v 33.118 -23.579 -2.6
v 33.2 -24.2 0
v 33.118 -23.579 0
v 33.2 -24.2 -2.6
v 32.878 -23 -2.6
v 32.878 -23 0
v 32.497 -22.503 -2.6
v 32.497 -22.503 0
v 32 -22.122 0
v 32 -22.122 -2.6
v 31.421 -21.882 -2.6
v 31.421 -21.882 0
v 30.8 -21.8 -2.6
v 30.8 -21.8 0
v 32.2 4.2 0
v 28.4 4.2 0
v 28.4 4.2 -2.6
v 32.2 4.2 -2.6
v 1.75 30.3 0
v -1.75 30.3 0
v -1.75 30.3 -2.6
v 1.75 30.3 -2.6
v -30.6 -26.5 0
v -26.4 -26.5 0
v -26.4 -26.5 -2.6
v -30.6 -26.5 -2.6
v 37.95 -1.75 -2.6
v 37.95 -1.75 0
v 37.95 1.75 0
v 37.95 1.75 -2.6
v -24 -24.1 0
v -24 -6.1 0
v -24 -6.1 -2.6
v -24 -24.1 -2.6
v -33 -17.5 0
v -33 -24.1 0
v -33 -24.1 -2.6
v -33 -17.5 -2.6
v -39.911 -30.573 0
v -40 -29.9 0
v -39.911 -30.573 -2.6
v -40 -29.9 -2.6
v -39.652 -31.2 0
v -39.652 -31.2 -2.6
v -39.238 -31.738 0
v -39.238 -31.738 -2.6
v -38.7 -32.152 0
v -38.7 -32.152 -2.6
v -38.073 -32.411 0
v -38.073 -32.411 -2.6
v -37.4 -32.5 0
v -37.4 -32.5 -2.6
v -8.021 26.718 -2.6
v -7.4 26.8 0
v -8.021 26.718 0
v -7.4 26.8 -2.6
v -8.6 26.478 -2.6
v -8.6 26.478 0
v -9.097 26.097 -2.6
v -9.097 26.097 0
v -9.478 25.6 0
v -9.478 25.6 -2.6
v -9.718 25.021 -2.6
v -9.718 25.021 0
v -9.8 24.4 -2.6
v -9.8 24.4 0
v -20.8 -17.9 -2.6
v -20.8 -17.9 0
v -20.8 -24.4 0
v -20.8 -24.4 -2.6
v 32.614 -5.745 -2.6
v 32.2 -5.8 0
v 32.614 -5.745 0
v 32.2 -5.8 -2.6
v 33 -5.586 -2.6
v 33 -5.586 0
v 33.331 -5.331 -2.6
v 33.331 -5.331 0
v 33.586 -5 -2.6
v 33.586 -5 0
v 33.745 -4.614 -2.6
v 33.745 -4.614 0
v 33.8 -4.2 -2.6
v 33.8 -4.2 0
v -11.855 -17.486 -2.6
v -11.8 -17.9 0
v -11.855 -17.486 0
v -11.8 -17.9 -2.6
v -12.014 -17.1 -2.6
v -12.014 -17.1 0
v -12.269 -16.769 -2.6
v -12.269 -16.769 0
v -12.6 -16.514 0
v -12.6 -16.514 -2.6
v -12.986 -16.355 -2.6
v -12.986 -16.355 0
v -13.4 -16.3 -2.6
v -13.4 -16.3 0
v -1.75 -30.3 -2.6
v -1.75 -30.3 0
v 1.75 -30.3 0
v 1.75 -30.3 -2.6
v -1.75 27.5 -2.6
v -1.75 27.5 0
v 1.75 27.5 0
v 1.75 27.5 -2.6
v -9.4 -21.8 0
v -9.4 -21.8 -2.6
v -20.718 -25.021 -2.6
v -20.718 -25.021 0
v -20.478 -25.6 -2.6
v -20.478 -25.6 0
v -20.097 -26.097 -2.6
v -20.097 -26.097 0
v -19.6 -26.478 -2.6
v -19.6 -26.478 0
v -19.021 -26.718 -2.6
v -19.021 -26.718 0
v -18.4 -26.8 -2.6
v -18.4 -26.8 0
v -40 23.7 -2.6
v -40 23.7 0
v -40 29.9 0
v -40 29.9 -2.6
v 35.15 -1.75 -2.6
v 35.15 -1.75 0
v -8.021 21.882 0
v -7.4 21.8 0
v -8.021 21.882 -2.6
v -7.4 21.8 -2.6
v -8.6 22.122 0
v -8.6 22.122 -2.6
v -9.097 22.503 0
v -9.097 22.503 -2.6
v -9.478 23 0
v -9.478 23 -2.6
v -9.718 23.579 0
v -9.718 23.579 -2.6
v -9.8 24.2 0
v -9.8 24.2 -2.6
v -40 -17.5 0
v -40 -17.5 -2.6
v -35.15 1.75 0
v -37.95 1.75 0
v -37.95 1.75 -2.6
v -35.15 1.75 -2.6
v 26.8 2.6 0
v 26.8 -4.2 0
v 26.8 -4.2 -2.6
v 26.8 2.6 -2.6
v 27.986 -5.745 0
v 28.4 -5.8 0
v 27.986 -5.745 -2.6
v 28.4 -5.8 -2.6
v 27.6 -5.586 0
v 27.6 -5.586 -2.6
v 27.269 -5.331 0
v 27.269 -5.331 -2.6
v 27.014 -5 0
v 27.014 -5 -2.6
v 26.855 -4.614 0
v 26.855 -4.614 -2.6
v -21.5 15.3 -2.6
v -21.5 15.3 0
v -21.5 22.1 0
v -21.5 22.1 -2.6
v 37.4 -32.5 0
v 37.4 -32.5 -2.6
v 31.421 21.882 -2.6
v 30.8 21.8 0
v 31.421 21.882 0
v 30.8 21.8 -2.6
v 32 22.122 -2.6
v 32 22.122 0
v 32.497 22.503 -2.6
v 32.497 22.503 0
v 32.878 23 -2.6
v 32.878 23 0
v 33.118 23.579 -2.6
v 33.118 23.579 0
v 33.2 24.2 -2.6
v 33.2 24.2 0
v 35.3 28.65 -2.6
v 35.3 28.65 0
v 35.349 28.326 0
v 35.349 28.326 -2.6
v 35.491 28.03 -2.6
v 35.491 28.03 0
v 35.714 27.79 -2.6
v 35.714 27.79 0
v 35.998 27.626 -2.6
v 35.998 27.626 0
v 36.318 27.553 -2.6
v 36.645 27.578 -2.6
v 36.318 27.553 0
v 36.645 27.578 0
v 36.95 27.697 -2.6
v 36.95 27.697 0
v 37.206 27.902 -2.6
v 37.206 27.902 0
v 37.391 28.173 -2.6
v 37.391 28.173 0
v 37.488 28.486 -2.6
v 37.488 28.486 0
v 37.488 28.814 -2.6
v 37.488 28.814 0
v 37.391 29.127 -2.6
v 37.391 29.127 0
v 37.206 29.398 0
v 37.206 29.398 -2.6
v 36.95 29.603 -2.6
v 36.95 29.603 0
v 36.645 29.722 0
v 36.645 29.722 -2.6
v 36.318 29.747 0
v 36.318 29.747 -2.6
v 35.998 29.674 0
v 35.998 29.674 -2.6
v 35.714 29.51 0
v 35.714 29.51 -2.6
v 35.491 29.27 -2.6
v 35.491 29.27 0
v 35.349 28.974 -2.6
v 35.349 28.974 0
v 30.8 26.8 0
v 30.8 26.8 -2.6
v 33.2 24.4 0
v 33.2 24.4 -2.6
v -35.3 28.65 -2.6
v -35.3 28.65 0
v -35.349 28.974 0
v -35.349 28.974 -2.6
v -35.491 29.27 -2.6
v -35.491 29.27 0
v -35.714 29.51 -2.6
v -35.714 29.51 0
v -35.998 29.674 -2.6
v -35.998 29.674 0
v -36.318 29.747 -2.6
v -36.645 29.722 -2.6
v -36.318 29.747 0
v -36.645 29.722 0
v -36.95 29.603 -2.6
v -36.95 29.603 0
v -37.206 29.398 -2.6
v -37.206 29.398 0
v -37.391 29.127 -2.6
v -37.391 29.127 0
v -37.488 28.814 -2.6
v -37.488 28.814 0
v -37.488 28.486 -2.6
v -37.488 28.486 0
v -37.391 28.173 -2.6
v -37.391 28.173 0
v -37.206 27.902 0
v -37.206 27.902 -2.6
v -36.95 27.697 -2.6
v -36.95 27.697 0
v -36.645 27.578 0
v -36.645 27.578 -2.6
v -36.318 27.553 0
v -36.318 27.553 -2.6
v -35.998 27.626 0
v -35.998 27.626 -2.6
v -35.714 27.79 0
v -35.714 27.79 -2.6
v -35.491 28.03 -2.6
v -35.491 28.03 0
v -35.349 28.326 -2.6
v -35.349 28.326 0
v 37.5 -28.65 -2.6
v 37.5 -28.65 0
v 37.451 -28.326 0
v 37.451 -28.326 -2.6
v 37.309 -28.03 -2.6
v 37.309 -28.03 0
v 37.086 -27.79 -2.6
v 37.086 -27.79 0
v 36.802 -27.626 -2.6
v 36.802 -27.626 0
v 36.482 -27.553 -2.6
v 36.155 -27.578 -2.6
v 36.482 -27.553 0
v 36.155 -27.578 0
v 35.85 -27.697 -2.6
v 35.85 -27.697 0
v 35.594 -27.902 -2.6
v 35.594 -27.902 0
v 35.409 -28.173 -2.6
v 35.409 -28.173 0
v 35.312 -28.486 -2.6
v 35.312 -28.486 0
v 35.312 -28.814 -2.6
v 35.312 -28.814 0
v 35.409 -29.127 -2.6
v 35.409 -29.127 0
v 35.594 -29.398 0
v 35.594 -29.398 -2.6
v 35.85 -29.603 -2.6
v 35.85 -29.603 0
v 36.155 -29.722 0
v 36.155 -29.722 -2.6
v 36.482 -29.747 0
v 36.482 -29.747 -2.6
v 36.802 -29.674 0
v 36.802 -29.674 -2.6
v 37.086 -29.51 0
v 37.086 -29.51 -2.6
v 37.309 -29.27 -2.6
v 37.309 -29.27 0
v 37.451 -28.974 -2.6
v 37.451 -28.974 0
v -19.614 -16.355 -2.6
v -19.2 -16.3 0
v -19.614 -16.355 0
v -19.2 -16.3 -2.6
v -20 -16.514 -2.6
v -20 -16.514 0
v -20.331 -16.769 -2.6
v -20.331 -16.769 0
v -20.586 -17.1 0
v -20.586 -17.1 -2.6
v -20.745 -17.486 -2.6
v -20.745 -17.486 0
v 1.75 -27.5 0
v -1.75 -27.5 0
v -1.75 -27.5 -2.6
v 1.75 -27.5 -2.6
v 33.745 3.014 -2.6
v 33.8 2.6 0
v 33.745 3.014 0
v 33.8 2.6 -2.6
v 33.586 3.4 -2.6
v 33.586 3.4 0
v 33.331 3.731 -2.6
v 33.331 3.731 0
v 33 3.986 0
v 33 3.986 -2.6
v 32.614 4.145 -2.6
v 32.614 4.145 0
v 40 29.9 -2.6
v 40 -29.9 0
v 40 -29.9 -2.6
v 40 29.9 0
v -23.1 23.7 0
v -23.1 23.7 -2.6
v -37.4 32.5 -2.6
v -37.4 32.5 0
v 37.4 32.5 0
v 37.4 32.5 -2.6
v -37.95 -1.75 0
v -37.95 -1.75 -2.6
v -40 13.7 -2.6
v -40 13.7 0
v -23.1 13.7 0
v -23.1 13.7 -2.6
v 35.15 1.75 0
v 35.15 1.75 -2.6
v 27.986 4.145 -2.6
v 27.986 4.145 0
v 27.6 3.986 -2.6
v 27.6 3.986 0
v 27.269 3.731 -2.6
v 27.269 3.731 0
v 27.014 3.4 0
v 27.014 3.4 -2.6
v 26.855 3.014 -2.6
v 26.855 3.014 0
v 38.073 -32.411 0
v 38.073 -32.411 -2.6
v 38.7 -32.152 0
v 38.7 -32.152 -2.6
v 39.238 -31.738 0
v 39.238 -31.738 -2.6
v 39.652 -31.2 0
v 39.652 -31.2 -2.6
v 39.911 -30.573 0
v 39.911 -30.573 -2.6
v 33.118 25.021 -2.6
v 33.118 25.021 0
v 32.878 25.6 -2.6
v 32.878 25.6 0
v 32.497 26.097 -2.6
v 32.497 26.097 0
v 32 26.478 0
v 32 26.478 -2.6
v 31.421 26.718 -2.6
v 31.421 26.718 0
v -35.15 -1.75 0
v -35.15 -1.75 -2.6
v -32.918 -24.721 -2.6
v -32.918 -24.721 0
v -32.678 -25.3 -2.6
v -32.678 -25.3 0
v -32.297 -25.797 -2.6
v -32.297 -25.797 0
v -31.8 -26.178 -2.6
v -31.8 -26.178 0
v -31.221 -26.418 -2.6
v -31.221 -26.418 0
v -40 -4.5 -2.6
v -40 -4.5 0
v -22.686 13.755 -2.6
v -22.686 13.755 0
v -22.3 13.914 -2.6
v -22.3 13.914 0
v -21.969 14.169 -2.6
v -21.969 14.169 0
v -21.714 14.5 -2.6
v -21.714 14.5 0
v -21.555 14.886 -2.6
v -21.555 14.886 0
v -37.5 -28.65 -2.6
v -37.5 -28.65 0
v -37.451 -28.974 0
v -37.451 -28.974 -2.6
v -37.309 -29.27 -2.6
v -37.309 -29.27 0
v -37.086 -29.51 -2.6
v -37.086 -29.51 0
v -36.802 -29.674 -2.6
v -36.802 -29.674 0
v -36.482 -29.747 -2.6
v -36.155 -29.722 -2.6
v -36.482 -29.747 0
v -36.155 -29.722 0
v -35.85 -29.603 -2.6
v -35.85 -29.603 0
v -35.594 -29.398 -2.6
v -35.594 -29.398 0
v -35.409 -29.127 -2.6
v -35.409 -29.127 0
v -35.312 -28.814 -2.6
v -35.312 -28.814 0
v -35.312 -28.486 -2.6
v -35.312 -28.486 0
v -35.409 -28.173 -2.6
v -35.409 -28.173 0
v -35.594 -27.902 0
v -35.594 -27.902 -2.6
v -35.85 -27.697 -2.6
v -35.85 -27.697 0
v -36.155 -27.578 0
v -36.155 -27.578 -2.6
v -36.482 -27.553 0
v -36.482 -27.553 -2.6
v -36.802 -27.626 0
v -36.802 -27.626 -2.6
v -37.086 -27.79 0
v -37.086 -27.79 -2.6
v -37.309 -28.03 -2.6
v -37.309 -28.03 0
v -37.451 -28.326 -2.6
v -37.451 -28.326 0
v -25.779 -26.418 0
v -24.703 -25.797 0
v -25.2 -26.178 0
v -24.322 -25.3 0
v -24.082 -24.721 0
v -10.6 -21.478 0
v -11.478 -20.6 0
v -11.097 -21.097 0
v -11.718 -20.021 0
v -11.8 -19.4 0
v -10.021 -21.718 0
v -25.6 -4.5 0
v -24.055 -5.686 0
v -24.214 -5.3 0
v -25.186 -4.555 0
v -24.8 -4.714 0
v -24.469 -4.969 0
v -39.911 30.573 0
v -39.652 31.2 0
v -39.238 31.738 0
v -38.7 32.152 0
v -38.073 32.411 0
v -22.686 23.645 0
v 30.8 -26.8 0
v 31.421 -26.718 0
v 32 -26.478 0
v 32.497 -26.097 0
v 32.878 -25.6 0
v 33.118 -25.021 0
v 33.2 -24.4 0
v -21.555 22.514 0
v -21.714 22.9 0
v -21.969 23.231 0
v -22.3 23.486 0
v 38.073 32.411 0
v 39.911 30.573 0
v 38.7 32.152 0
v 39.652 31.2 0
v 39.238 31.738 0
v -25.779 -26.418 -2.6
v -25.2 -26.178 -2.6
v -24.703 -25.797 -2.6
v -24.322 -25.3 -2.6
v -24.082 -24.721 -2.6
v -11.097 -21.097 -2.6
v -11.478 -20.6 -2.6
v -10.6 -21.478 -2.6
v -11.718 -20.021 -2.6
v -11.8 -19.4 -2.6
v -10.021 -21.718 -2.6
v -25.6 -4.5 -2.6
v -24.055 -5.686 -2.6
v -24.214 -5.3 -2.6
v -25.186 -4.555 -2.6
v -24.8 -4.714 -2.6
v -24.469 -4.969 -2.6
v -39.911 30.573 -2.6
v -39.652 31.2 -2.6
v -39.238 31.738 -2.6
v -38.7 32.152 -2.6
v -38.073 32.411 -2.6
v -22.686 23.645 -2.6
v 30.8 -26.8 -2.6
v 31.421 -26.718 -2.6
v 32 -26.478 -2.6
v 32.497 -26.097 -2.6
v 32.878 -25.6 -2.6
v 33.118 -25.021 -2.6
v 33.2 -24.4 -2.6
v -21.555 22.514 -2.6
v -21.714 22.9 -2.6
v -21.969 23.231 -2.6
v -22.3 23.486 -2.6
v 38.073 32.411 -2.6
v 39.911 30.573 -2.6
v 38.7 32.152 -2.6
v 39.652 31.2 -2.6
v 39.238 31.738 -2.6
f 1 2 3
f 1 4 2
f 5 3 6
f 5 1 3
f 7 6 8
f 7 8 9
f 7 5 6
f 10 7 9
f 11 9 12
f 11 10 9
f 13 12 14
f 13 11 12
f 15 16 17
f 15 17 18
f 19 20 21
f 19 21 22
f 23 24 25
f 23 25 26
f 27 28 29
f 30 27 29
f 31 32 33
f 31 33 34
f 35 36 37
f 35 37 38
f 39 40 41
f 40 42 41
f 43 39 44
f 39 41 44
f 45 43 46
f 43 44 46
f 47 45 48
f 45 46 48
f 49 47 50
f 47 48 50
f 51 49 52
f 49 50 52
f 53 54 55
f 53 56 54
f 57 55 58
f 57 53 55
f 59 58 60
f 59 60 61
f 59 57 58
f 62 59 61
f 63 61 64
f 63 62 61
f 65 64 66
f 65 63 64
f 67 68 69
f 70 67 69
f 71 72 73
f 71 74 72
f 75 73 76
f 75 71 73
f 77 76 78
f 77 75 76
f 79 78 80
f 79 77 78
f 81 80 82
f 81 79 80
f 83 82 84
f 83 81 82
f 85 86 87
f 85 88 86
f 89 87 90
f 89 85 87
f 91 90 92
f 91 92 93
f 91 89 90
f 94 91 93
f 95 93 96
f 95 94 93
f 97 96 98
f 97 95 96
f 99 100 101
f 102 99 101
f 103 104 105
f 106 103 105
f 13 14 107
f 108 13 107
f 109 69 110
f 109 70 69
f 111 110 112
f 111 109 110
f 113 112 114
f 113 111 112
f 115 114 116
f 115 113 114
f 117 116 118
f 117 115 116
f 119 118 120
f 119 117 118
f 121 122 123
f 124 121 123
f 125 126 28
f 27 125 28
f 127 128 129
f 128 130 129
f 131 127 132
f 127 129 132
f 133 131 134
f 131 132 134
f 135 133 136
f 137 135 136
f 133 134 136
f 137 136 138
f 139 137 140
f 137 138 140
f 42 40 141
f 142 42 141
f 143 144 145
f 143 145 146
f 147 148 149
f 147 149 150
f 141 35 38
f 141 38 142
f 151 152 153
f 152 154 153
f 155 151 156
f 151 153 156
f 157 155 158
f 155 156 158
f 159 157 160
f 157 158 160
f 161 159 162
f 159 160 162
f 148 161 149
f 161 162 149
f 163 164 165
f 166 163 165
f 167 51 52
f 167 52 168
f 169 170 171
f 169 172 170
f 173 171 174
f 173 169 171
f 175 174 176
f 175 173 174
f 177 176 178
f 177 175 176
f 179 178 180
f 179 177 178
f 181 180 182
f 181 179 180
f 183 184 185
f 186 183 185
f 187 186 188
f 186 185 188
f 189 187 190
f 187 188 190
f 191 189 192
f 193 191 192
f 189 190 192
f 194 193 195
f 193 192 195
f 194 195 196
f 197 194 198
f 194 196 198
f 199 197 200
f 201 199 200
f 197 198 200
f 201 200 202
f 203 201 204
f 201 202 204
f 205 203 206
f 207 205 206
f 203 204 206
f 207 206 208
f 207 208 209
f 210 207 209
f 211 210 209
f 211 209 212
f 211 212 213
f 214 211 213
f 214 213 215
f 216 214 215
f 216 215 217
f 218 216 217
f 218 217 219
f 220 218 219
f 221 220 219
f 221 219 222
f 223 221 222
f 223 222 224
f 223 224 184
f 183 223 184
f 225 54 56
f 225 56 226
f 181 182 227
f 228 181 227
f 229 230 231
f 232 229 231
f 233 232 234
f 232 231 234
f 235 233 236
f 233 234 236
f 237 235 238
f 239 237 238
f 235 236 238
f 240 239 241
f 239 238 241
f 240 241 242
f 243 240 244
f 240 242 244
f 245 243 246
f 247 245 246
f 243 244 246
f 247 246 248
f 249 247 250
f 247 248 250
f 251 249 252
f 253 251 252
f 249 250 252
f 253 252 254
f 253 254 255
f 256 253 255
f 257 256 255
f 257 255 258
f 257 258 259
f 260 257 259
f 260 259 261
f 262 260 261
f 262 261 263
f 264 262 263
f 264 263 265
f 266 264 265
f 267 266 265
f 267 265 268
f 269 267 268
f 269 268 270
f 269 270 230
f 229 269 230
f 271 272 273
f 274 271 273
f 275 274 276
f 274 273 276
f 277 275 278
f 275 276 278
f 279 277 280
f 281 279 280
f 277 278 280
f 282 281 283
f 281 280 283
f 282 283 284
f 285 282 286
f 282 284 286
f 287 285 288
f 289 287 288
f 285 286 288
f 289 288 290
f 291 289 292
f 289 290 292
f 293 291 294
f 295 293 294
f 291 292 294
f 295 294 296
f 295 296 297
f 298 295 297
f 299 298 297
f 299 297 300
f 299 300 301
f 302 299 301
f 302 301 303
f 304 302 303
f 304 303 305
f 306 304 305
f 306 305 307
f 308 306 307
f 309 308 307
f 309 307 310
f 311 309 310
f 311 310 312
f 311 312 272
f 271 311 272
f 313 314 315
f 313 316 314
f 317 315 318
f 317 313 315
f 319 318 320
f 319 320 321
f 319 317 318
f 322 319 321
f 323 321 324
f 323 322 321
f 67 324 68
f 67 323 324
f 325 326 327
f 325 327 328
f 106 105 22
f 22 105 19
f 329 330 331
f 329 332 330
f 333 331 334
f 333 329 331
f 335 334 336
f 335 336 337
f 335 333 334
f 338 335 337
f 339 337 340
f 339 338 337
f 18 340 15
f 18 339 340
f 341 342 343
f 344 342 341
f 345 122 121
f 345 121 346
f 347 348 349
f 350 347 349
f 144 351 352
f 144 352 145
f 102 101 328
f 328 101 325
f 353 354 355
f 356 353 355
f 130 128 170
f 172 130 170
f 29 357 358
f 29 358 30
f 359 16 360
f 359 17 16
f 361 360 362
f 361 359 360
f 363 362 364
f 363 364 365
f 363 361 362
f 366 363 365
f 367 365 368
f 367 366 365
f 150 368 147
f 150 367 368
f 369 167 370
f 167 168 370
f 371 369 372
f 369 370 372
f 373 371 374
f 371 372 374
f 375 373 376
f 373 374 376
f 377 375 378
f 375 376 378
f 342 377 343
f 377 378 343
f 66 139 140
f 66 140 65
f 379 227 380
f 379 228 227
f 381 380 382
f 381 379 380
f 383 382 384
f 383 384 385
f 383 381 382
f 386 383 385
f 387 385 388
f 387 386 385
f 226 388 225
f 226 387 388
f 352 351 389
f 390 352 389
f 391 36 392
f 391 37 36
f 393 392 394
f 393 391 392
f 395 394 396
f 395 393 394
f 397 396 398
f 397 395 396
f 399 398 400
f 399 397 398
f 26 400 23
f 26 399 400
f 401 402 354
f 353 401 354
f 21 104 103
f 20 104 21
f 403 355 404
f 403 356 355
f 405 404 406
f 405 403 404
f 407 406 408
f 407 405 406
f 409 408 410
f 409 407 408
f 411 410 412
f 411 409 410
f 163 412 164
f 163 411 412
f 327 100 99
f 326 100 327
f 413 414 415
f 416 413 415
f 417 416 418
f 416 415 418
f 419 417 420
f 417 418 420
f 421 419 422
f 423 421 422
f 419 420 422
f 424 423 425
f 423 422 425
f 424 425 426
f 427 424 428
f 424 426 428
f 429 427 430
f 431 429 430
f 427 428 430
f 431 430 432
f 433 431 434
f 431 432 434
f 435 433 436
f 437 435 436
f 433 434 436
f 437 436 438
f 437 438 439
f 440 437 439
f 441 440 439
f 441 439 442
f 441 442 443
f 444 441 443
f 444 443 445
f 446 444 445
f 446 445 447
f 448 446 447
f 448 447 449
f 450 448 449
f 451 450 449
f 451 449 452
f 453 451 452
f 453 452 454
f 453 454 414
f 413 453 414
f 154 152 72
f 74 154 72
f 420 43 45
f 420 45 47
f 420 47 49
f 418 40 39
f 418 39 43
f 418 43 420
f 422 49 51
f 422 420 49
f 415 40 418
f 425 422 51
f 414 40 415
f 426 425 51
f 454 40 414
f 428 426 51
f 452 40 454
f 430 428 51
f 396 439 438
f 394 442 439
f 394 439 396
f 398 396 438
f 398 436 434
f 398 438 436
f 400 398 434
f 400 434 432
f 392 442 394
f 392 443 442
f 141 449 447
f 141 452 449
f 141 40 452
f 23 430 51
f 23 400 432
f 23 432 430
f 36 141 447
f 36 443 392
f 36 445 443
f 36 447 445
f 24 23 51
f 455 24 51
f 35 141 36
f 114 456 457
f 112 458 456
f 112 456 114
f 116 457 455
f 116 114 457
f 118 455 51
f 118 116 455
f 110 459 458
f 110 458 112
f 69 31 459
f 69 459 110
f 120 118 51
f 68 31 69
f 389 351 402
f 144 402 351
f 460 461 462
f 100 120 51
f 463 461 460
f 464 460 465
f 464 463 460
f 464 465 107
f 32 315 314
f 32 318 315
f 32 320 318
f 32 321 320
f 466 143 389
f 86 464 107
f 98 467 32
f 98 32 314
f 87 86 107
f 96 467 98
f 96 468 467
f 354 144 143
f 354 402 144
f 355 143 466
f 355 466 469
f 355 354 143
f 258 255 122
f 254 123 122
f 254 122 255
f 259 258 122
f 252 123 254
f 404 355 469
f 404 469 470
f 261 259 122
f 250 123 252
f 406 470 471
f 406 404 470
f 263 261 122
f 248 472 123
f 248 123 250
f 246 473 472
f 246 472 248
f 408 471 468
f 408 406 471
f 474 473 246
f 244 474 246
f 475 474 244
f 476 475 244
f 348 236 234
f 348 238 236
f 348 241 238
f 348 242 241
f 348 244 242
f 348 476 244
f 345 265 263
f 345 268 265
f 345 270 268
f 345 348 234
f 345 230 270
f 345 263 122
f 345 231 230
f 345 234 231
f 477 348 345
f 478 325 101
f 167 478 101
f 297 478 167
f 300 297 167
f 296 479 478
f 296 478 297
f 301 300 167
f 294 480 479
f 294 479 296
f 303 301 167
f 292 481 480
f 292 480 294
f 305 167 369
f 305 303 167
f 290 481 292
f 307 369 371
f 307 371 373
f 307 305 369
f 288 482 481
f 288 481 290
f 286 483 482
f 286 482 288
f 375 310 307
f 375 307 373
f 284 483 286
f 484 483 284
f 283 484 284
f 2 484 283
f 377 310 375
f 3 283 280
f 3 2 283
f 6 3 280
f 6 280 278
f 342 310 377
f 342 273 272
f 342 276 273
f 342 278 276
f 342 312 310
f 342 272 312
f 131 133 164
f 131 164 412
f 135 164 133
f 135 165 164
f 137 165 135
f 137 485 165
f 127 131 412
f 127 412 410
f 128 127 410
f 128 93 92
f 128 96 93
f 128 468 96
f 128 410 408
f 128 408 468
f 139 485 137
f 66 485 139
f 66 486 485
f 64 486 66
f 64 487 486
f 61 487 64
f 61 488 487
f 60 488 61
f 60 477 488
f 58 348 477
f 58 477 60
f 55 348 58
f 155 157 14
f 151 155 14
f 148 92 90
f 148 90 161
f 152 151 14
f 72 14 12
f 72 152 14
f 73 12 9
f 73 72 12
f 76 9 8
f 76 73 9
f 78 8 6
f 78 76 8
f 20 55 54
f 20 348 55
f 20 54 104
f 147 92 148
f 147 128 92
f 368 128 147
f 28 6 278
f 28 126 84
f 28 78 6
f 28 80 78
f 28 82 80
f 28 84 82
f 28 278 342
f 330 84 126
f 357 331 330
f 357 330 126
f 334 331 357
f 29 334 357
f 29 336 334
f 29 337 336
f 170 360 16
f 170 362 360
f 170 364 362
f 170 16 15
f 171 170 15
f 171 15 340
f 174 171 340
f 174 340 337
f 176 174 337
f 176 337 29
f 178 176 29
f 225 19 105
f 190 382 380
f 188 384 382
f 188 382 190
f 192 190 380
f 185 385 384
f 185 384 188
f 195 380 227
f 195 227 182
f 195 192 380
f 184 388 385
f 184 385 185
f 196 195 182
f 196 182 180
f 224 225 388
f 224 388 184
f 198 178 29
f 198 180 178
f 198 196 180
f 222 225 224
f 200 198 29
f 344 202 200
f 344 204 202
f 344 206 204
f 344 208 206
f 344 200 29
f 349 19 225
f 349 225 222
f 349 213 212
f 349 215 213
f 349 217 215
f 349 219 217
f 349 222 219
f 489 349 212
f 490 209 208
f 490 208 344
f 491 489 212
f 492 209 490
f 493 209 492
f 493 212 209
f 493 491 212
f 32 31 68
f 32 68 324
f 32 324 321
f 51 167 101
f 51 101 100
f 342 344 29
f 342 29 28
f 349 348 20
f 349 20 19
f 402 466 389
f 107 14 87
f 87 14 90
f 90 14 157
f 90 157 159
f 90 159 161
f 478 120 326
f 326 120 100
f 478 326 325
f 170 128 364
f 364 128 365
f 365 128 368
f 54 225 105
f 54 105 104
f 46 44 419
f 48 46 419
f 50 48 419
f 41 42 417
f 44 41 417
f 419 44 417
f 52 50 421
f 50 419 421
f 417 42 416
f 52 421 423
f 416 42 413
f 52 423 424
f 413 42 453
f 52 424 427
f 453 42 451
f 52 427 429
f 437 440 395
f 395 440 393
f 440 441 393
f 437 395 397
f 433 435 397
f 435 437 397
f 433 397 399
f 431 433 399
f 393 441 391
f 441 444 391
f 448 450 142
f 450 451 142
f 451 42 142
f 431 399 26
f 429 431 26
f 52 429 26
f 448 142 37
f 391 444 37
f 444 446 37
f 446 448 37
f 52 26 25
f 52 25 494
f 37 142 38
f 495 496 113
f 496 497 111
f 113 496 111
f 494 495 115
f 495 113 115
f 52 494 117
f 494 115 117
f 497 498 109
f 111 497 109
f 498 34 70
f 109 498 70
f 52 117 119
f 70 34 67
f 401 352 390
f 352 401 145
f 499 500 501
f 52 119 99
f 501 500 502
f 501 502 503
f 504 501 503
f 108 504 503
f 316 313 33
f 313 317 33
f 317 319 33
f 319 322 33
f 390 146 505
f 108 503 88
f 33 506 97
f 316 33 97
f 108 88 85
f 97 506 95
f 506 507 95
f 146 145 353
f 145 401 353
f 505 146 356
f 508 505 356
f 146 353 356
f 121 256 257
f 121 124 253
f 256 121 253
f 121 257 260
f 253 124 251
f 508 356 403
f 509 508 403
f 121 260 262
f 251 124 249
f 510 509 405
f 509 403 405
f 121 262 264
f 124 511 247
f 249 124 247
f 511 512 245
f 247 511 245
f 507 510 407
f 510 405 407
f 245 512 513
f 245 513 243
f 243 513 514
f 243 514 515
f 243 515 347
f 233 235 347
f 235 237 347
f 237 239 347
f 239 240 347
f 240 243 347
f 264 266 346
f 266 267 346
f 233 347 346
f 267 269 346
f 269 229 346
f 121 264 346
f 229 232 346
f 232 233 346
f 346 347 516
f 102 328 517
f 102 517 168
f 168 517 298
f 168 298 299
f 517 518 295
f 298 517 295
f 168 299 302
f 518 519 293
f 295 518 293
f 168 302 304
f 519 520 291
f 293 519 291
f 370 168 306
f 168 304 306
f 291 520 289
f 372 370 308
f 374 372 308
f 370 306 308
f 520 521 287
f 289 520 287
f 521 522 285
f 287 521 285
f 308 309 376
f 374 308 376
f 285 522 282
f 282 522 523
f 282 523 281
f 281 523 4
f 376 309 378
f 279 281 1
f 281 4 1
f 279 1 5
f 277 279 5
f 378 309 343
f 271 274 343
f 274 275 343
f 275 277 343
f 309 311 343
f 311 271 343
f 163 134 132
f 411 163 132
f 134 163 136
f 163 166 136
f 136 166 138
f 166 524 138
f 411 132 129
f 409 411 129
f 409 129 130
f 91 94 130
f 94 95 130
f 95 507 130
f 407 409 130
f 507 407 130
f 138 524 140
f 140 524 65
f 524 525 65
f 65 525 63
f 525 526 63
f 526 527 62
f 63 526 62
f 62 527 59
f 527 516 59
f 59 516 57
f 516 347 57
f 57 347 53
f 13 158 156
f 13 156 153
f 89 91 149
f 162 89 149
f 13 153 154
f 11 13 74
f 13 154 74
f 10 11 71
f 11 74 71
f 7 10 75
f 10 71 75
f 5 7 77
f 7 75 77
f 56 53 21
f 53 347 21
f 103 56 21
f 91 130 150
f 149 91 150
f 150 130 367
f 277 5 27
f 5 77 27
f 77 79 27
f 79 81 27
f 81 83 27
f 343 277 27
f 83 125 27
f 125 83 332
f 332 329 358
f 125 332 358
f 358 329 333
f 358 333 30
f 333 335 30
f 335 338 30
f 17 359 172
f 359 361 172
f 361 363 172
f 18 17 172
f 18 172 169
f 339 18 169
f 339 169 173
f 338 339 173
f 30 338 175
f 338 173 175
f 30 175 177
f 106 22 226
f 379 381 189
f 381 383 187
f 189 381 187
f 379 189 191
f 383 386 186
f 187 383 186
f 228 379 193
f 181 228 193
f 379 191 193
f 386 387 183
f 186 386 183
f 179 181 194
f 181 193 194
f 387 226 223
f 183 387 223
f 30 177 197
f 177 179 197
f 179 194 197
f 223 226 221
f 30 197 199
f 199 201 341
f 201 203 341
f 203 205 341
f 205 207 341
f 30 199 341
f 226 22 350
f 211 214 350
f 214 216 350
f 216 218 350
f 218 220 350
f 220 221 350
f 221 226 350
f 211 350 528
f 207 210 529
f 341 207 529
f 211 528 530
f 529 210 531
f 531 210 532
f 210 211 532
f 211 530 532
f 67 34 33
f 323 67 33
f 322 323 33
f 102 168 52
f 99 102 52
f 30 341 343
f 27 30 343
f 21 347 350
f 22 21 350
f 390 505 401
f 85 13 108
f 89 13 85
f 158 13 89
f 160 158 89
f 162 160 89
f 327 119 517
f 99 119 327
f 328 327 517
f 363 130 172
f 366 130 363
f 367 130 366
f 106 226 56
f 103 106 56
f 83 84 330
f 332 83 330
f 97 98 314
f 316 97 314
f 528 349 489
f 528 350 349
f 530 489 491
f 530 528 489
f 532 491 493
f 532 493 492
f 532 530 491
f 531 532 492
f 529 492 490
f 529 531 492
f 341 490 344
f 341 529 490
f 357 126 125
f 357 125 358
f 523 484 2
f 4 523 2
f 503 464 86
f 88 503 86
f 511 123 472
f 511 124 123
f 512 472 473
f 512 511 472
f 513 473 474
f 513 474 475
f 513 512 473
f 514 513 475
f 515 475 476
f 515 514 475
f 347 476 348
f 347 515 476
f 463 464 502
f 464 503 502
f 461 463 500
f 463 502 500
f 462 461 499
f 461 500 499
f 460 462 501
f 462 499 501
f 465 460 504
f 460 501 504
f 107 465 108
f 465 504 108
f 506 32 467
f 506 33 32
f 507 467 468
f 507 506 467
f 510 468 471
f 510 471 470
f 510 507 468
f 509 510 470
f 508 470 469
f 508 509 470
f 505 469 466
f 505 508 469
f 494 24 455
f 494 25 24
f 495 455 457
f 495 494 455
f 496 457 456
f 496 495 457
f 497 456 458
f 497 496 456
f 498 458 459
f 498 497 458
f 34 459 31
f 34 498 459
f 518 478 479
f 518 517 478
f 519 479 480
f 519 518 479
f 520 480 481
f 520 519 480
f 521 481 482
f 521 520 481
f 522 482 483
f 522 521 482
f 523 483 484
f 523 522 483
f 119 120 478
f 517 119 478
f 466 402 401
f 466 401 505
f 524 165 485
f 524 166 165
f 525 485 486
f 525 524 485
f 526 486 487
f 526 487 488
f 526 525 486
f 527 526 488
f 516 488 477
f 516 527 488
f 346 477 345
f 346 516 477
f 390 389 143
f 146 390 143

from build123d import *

# Parameters (mm, degrees)
SKETCH1_W          = 80
SKETCH1_H          = 65
BASE_FLANGE1_DEPTH = 2.6
SKETCH6_R          = 1.0999978
CUT_EXTRUDE1_DEPTH = 10
FILLET1_R          = 2.6
SKETCH7_W          = 18.5
SKETCH7_H          = 10
SKETCH7_W_2        = 43
SKETCH7_H_2        = 5
SKETCH7_W_3        = 7
CUT_EXTRUDE2_DEPTH = 2.6
FILLET2_R          = 2.4
FILLET3_R          = 1.6
SKETCH11_W         = 3.5
SKETCH11_H         = 2.8
SKETCH11_W_2       = 2.8
SKETCH11_H_2       = 3.5
CUT_EXTRUDE5_DEPTH = 10


# Sheet-metal steps are written as plain solids
with BuildPart() as part:
    # Sketch1 → Base-Flange1 (new body)
    with BuildSketch(Plane.XY):
        Rectangle(SKETCH1_W, SKETCH1_H)
    extrude(amount=-BASE_FLANGE1_DEPTH)

    # Sketch6 → Cut-Extrude1 (cut)
    with BuildSketch(Plane.XY):
        with Locations((-36.4, 28.65)):
            Circle(SKETCH6_R)
        with Locations(Location((-36.4, -28.65, 0), (0, 0, 180))):
            Circle(SKETCH6_R)
        with Locations((36.4, -28.65)):
            Circle(SKETCH6_R)
        with Locations(Location((36.4, 28.65, 0), (0, 0, 180))):
            Circle(SKETCH6_R)
    extrude(amount=-CUT_EXTRUDE1_DEPTH, mode=Mode.SUBTRACT)

    # Fillet1
    fillet1_edges = [part.edges().sort_by_distance(p)[0] for p in [
        (-40, 32.5, -1.3),
        (40, 32.5, -1.3),
        (40, -32.5, -1.3),
        (-40, -32.5, -1.3),
    ]]
    fillet(fillet1_edges, radius=FILLET1_R)

    # Sketch7 → Cut-Extrude2 (cut)
    with BuildSketch(Plane.XY):
        with Locations((-30.75, 18.7)):
            Rectangle(SKETCH7_W, SKETCH7_H)
        Polygon((-40, -4.5), (-24, -4.5), (-24, -26.5), (-33, -26.5), (-33, -17.5), (-40, -17.5), align=None)
        with Locations((11.7, 24.3)):
            Rectangle(SKETCH7_W_2, SKETCH7_H_2)
        Polygon((-11.8, -21.8), (-11.8, -16.3), (-20.8, -16.3), (-20.8, -26.8), (33.2, -26.8), (33.2, -21.8), align=None)
        with Locations((30.3, -0.8)):
            Rectangle(SKETCH7_W_3, SKETCH7_H)
    extrude(amount=-CUT_EXTRUDE2_DEPTH, mode=Mode.SUBTRACT)

    # Fillet2
    fillet2_edges = [part.edges().sort_by_distance(p)[0] for p in [
        (-9.8, 21.8, -1.3),
        (-9.8, 26.8, -1.3),
        (33.2, 26.8, -1.3),
        (33.2, 21.8, -1.3),
        (33.2, -21.8, -1.3),
        (33.2, -26.8, -1.3),
        (-20.8, -26.8, -1.3),
        (-11.8, -21.8, -1.3),
        (-24, -26.5, -1.3),
        (-33, -26.5, -1.3),
    ]]
    fillet(fillet2_edges, radius=FILLET2_R)

    # Fillet3
    fillet3_edges = [part.edges().sort_by_distance(p)[0] for p in [
        (26.8, -5.8, -1.3),
        (26.8, 4.2, -1.3),
        (33.8, 4.2, -1.3),
        (33.8, -5.8, -1.3),
        (-20.8, -16.3, -1.3),
        (-11.8, -16.3, -1.3),
        (-21.5, 23.7, -1.3),
        (-21.5, 13.7, -1.3),
        (-24, -4.5, -1.3),
    ]]
    fillet(fillet3_edges, radius=FILLET3_R)

    # Sketch11 → Cut-Extrude5 (cut)
    with BuildSketch(Plane.XY):
        with Locations((0, 28.9)):
            Rectangle(SKETCH11_W, SKETCH11_H)
        with Locations((36.55, 0)):
            Rectangle(SKETCH11_W_2, SKETCH11_H_2)
        with Locations((0, -28.9)):
            Rectangle(SKETCH11_W, SKETCH11_H)
        with Locations((-36.55, 0)):
            Rectangle(SKETCH11_W_2, SKETCH11_H_2)
    extrude(amount=-CUT_EXTRUDE5_DEPTH, mode=Mode.SUBTRACT)


solid = part.part
